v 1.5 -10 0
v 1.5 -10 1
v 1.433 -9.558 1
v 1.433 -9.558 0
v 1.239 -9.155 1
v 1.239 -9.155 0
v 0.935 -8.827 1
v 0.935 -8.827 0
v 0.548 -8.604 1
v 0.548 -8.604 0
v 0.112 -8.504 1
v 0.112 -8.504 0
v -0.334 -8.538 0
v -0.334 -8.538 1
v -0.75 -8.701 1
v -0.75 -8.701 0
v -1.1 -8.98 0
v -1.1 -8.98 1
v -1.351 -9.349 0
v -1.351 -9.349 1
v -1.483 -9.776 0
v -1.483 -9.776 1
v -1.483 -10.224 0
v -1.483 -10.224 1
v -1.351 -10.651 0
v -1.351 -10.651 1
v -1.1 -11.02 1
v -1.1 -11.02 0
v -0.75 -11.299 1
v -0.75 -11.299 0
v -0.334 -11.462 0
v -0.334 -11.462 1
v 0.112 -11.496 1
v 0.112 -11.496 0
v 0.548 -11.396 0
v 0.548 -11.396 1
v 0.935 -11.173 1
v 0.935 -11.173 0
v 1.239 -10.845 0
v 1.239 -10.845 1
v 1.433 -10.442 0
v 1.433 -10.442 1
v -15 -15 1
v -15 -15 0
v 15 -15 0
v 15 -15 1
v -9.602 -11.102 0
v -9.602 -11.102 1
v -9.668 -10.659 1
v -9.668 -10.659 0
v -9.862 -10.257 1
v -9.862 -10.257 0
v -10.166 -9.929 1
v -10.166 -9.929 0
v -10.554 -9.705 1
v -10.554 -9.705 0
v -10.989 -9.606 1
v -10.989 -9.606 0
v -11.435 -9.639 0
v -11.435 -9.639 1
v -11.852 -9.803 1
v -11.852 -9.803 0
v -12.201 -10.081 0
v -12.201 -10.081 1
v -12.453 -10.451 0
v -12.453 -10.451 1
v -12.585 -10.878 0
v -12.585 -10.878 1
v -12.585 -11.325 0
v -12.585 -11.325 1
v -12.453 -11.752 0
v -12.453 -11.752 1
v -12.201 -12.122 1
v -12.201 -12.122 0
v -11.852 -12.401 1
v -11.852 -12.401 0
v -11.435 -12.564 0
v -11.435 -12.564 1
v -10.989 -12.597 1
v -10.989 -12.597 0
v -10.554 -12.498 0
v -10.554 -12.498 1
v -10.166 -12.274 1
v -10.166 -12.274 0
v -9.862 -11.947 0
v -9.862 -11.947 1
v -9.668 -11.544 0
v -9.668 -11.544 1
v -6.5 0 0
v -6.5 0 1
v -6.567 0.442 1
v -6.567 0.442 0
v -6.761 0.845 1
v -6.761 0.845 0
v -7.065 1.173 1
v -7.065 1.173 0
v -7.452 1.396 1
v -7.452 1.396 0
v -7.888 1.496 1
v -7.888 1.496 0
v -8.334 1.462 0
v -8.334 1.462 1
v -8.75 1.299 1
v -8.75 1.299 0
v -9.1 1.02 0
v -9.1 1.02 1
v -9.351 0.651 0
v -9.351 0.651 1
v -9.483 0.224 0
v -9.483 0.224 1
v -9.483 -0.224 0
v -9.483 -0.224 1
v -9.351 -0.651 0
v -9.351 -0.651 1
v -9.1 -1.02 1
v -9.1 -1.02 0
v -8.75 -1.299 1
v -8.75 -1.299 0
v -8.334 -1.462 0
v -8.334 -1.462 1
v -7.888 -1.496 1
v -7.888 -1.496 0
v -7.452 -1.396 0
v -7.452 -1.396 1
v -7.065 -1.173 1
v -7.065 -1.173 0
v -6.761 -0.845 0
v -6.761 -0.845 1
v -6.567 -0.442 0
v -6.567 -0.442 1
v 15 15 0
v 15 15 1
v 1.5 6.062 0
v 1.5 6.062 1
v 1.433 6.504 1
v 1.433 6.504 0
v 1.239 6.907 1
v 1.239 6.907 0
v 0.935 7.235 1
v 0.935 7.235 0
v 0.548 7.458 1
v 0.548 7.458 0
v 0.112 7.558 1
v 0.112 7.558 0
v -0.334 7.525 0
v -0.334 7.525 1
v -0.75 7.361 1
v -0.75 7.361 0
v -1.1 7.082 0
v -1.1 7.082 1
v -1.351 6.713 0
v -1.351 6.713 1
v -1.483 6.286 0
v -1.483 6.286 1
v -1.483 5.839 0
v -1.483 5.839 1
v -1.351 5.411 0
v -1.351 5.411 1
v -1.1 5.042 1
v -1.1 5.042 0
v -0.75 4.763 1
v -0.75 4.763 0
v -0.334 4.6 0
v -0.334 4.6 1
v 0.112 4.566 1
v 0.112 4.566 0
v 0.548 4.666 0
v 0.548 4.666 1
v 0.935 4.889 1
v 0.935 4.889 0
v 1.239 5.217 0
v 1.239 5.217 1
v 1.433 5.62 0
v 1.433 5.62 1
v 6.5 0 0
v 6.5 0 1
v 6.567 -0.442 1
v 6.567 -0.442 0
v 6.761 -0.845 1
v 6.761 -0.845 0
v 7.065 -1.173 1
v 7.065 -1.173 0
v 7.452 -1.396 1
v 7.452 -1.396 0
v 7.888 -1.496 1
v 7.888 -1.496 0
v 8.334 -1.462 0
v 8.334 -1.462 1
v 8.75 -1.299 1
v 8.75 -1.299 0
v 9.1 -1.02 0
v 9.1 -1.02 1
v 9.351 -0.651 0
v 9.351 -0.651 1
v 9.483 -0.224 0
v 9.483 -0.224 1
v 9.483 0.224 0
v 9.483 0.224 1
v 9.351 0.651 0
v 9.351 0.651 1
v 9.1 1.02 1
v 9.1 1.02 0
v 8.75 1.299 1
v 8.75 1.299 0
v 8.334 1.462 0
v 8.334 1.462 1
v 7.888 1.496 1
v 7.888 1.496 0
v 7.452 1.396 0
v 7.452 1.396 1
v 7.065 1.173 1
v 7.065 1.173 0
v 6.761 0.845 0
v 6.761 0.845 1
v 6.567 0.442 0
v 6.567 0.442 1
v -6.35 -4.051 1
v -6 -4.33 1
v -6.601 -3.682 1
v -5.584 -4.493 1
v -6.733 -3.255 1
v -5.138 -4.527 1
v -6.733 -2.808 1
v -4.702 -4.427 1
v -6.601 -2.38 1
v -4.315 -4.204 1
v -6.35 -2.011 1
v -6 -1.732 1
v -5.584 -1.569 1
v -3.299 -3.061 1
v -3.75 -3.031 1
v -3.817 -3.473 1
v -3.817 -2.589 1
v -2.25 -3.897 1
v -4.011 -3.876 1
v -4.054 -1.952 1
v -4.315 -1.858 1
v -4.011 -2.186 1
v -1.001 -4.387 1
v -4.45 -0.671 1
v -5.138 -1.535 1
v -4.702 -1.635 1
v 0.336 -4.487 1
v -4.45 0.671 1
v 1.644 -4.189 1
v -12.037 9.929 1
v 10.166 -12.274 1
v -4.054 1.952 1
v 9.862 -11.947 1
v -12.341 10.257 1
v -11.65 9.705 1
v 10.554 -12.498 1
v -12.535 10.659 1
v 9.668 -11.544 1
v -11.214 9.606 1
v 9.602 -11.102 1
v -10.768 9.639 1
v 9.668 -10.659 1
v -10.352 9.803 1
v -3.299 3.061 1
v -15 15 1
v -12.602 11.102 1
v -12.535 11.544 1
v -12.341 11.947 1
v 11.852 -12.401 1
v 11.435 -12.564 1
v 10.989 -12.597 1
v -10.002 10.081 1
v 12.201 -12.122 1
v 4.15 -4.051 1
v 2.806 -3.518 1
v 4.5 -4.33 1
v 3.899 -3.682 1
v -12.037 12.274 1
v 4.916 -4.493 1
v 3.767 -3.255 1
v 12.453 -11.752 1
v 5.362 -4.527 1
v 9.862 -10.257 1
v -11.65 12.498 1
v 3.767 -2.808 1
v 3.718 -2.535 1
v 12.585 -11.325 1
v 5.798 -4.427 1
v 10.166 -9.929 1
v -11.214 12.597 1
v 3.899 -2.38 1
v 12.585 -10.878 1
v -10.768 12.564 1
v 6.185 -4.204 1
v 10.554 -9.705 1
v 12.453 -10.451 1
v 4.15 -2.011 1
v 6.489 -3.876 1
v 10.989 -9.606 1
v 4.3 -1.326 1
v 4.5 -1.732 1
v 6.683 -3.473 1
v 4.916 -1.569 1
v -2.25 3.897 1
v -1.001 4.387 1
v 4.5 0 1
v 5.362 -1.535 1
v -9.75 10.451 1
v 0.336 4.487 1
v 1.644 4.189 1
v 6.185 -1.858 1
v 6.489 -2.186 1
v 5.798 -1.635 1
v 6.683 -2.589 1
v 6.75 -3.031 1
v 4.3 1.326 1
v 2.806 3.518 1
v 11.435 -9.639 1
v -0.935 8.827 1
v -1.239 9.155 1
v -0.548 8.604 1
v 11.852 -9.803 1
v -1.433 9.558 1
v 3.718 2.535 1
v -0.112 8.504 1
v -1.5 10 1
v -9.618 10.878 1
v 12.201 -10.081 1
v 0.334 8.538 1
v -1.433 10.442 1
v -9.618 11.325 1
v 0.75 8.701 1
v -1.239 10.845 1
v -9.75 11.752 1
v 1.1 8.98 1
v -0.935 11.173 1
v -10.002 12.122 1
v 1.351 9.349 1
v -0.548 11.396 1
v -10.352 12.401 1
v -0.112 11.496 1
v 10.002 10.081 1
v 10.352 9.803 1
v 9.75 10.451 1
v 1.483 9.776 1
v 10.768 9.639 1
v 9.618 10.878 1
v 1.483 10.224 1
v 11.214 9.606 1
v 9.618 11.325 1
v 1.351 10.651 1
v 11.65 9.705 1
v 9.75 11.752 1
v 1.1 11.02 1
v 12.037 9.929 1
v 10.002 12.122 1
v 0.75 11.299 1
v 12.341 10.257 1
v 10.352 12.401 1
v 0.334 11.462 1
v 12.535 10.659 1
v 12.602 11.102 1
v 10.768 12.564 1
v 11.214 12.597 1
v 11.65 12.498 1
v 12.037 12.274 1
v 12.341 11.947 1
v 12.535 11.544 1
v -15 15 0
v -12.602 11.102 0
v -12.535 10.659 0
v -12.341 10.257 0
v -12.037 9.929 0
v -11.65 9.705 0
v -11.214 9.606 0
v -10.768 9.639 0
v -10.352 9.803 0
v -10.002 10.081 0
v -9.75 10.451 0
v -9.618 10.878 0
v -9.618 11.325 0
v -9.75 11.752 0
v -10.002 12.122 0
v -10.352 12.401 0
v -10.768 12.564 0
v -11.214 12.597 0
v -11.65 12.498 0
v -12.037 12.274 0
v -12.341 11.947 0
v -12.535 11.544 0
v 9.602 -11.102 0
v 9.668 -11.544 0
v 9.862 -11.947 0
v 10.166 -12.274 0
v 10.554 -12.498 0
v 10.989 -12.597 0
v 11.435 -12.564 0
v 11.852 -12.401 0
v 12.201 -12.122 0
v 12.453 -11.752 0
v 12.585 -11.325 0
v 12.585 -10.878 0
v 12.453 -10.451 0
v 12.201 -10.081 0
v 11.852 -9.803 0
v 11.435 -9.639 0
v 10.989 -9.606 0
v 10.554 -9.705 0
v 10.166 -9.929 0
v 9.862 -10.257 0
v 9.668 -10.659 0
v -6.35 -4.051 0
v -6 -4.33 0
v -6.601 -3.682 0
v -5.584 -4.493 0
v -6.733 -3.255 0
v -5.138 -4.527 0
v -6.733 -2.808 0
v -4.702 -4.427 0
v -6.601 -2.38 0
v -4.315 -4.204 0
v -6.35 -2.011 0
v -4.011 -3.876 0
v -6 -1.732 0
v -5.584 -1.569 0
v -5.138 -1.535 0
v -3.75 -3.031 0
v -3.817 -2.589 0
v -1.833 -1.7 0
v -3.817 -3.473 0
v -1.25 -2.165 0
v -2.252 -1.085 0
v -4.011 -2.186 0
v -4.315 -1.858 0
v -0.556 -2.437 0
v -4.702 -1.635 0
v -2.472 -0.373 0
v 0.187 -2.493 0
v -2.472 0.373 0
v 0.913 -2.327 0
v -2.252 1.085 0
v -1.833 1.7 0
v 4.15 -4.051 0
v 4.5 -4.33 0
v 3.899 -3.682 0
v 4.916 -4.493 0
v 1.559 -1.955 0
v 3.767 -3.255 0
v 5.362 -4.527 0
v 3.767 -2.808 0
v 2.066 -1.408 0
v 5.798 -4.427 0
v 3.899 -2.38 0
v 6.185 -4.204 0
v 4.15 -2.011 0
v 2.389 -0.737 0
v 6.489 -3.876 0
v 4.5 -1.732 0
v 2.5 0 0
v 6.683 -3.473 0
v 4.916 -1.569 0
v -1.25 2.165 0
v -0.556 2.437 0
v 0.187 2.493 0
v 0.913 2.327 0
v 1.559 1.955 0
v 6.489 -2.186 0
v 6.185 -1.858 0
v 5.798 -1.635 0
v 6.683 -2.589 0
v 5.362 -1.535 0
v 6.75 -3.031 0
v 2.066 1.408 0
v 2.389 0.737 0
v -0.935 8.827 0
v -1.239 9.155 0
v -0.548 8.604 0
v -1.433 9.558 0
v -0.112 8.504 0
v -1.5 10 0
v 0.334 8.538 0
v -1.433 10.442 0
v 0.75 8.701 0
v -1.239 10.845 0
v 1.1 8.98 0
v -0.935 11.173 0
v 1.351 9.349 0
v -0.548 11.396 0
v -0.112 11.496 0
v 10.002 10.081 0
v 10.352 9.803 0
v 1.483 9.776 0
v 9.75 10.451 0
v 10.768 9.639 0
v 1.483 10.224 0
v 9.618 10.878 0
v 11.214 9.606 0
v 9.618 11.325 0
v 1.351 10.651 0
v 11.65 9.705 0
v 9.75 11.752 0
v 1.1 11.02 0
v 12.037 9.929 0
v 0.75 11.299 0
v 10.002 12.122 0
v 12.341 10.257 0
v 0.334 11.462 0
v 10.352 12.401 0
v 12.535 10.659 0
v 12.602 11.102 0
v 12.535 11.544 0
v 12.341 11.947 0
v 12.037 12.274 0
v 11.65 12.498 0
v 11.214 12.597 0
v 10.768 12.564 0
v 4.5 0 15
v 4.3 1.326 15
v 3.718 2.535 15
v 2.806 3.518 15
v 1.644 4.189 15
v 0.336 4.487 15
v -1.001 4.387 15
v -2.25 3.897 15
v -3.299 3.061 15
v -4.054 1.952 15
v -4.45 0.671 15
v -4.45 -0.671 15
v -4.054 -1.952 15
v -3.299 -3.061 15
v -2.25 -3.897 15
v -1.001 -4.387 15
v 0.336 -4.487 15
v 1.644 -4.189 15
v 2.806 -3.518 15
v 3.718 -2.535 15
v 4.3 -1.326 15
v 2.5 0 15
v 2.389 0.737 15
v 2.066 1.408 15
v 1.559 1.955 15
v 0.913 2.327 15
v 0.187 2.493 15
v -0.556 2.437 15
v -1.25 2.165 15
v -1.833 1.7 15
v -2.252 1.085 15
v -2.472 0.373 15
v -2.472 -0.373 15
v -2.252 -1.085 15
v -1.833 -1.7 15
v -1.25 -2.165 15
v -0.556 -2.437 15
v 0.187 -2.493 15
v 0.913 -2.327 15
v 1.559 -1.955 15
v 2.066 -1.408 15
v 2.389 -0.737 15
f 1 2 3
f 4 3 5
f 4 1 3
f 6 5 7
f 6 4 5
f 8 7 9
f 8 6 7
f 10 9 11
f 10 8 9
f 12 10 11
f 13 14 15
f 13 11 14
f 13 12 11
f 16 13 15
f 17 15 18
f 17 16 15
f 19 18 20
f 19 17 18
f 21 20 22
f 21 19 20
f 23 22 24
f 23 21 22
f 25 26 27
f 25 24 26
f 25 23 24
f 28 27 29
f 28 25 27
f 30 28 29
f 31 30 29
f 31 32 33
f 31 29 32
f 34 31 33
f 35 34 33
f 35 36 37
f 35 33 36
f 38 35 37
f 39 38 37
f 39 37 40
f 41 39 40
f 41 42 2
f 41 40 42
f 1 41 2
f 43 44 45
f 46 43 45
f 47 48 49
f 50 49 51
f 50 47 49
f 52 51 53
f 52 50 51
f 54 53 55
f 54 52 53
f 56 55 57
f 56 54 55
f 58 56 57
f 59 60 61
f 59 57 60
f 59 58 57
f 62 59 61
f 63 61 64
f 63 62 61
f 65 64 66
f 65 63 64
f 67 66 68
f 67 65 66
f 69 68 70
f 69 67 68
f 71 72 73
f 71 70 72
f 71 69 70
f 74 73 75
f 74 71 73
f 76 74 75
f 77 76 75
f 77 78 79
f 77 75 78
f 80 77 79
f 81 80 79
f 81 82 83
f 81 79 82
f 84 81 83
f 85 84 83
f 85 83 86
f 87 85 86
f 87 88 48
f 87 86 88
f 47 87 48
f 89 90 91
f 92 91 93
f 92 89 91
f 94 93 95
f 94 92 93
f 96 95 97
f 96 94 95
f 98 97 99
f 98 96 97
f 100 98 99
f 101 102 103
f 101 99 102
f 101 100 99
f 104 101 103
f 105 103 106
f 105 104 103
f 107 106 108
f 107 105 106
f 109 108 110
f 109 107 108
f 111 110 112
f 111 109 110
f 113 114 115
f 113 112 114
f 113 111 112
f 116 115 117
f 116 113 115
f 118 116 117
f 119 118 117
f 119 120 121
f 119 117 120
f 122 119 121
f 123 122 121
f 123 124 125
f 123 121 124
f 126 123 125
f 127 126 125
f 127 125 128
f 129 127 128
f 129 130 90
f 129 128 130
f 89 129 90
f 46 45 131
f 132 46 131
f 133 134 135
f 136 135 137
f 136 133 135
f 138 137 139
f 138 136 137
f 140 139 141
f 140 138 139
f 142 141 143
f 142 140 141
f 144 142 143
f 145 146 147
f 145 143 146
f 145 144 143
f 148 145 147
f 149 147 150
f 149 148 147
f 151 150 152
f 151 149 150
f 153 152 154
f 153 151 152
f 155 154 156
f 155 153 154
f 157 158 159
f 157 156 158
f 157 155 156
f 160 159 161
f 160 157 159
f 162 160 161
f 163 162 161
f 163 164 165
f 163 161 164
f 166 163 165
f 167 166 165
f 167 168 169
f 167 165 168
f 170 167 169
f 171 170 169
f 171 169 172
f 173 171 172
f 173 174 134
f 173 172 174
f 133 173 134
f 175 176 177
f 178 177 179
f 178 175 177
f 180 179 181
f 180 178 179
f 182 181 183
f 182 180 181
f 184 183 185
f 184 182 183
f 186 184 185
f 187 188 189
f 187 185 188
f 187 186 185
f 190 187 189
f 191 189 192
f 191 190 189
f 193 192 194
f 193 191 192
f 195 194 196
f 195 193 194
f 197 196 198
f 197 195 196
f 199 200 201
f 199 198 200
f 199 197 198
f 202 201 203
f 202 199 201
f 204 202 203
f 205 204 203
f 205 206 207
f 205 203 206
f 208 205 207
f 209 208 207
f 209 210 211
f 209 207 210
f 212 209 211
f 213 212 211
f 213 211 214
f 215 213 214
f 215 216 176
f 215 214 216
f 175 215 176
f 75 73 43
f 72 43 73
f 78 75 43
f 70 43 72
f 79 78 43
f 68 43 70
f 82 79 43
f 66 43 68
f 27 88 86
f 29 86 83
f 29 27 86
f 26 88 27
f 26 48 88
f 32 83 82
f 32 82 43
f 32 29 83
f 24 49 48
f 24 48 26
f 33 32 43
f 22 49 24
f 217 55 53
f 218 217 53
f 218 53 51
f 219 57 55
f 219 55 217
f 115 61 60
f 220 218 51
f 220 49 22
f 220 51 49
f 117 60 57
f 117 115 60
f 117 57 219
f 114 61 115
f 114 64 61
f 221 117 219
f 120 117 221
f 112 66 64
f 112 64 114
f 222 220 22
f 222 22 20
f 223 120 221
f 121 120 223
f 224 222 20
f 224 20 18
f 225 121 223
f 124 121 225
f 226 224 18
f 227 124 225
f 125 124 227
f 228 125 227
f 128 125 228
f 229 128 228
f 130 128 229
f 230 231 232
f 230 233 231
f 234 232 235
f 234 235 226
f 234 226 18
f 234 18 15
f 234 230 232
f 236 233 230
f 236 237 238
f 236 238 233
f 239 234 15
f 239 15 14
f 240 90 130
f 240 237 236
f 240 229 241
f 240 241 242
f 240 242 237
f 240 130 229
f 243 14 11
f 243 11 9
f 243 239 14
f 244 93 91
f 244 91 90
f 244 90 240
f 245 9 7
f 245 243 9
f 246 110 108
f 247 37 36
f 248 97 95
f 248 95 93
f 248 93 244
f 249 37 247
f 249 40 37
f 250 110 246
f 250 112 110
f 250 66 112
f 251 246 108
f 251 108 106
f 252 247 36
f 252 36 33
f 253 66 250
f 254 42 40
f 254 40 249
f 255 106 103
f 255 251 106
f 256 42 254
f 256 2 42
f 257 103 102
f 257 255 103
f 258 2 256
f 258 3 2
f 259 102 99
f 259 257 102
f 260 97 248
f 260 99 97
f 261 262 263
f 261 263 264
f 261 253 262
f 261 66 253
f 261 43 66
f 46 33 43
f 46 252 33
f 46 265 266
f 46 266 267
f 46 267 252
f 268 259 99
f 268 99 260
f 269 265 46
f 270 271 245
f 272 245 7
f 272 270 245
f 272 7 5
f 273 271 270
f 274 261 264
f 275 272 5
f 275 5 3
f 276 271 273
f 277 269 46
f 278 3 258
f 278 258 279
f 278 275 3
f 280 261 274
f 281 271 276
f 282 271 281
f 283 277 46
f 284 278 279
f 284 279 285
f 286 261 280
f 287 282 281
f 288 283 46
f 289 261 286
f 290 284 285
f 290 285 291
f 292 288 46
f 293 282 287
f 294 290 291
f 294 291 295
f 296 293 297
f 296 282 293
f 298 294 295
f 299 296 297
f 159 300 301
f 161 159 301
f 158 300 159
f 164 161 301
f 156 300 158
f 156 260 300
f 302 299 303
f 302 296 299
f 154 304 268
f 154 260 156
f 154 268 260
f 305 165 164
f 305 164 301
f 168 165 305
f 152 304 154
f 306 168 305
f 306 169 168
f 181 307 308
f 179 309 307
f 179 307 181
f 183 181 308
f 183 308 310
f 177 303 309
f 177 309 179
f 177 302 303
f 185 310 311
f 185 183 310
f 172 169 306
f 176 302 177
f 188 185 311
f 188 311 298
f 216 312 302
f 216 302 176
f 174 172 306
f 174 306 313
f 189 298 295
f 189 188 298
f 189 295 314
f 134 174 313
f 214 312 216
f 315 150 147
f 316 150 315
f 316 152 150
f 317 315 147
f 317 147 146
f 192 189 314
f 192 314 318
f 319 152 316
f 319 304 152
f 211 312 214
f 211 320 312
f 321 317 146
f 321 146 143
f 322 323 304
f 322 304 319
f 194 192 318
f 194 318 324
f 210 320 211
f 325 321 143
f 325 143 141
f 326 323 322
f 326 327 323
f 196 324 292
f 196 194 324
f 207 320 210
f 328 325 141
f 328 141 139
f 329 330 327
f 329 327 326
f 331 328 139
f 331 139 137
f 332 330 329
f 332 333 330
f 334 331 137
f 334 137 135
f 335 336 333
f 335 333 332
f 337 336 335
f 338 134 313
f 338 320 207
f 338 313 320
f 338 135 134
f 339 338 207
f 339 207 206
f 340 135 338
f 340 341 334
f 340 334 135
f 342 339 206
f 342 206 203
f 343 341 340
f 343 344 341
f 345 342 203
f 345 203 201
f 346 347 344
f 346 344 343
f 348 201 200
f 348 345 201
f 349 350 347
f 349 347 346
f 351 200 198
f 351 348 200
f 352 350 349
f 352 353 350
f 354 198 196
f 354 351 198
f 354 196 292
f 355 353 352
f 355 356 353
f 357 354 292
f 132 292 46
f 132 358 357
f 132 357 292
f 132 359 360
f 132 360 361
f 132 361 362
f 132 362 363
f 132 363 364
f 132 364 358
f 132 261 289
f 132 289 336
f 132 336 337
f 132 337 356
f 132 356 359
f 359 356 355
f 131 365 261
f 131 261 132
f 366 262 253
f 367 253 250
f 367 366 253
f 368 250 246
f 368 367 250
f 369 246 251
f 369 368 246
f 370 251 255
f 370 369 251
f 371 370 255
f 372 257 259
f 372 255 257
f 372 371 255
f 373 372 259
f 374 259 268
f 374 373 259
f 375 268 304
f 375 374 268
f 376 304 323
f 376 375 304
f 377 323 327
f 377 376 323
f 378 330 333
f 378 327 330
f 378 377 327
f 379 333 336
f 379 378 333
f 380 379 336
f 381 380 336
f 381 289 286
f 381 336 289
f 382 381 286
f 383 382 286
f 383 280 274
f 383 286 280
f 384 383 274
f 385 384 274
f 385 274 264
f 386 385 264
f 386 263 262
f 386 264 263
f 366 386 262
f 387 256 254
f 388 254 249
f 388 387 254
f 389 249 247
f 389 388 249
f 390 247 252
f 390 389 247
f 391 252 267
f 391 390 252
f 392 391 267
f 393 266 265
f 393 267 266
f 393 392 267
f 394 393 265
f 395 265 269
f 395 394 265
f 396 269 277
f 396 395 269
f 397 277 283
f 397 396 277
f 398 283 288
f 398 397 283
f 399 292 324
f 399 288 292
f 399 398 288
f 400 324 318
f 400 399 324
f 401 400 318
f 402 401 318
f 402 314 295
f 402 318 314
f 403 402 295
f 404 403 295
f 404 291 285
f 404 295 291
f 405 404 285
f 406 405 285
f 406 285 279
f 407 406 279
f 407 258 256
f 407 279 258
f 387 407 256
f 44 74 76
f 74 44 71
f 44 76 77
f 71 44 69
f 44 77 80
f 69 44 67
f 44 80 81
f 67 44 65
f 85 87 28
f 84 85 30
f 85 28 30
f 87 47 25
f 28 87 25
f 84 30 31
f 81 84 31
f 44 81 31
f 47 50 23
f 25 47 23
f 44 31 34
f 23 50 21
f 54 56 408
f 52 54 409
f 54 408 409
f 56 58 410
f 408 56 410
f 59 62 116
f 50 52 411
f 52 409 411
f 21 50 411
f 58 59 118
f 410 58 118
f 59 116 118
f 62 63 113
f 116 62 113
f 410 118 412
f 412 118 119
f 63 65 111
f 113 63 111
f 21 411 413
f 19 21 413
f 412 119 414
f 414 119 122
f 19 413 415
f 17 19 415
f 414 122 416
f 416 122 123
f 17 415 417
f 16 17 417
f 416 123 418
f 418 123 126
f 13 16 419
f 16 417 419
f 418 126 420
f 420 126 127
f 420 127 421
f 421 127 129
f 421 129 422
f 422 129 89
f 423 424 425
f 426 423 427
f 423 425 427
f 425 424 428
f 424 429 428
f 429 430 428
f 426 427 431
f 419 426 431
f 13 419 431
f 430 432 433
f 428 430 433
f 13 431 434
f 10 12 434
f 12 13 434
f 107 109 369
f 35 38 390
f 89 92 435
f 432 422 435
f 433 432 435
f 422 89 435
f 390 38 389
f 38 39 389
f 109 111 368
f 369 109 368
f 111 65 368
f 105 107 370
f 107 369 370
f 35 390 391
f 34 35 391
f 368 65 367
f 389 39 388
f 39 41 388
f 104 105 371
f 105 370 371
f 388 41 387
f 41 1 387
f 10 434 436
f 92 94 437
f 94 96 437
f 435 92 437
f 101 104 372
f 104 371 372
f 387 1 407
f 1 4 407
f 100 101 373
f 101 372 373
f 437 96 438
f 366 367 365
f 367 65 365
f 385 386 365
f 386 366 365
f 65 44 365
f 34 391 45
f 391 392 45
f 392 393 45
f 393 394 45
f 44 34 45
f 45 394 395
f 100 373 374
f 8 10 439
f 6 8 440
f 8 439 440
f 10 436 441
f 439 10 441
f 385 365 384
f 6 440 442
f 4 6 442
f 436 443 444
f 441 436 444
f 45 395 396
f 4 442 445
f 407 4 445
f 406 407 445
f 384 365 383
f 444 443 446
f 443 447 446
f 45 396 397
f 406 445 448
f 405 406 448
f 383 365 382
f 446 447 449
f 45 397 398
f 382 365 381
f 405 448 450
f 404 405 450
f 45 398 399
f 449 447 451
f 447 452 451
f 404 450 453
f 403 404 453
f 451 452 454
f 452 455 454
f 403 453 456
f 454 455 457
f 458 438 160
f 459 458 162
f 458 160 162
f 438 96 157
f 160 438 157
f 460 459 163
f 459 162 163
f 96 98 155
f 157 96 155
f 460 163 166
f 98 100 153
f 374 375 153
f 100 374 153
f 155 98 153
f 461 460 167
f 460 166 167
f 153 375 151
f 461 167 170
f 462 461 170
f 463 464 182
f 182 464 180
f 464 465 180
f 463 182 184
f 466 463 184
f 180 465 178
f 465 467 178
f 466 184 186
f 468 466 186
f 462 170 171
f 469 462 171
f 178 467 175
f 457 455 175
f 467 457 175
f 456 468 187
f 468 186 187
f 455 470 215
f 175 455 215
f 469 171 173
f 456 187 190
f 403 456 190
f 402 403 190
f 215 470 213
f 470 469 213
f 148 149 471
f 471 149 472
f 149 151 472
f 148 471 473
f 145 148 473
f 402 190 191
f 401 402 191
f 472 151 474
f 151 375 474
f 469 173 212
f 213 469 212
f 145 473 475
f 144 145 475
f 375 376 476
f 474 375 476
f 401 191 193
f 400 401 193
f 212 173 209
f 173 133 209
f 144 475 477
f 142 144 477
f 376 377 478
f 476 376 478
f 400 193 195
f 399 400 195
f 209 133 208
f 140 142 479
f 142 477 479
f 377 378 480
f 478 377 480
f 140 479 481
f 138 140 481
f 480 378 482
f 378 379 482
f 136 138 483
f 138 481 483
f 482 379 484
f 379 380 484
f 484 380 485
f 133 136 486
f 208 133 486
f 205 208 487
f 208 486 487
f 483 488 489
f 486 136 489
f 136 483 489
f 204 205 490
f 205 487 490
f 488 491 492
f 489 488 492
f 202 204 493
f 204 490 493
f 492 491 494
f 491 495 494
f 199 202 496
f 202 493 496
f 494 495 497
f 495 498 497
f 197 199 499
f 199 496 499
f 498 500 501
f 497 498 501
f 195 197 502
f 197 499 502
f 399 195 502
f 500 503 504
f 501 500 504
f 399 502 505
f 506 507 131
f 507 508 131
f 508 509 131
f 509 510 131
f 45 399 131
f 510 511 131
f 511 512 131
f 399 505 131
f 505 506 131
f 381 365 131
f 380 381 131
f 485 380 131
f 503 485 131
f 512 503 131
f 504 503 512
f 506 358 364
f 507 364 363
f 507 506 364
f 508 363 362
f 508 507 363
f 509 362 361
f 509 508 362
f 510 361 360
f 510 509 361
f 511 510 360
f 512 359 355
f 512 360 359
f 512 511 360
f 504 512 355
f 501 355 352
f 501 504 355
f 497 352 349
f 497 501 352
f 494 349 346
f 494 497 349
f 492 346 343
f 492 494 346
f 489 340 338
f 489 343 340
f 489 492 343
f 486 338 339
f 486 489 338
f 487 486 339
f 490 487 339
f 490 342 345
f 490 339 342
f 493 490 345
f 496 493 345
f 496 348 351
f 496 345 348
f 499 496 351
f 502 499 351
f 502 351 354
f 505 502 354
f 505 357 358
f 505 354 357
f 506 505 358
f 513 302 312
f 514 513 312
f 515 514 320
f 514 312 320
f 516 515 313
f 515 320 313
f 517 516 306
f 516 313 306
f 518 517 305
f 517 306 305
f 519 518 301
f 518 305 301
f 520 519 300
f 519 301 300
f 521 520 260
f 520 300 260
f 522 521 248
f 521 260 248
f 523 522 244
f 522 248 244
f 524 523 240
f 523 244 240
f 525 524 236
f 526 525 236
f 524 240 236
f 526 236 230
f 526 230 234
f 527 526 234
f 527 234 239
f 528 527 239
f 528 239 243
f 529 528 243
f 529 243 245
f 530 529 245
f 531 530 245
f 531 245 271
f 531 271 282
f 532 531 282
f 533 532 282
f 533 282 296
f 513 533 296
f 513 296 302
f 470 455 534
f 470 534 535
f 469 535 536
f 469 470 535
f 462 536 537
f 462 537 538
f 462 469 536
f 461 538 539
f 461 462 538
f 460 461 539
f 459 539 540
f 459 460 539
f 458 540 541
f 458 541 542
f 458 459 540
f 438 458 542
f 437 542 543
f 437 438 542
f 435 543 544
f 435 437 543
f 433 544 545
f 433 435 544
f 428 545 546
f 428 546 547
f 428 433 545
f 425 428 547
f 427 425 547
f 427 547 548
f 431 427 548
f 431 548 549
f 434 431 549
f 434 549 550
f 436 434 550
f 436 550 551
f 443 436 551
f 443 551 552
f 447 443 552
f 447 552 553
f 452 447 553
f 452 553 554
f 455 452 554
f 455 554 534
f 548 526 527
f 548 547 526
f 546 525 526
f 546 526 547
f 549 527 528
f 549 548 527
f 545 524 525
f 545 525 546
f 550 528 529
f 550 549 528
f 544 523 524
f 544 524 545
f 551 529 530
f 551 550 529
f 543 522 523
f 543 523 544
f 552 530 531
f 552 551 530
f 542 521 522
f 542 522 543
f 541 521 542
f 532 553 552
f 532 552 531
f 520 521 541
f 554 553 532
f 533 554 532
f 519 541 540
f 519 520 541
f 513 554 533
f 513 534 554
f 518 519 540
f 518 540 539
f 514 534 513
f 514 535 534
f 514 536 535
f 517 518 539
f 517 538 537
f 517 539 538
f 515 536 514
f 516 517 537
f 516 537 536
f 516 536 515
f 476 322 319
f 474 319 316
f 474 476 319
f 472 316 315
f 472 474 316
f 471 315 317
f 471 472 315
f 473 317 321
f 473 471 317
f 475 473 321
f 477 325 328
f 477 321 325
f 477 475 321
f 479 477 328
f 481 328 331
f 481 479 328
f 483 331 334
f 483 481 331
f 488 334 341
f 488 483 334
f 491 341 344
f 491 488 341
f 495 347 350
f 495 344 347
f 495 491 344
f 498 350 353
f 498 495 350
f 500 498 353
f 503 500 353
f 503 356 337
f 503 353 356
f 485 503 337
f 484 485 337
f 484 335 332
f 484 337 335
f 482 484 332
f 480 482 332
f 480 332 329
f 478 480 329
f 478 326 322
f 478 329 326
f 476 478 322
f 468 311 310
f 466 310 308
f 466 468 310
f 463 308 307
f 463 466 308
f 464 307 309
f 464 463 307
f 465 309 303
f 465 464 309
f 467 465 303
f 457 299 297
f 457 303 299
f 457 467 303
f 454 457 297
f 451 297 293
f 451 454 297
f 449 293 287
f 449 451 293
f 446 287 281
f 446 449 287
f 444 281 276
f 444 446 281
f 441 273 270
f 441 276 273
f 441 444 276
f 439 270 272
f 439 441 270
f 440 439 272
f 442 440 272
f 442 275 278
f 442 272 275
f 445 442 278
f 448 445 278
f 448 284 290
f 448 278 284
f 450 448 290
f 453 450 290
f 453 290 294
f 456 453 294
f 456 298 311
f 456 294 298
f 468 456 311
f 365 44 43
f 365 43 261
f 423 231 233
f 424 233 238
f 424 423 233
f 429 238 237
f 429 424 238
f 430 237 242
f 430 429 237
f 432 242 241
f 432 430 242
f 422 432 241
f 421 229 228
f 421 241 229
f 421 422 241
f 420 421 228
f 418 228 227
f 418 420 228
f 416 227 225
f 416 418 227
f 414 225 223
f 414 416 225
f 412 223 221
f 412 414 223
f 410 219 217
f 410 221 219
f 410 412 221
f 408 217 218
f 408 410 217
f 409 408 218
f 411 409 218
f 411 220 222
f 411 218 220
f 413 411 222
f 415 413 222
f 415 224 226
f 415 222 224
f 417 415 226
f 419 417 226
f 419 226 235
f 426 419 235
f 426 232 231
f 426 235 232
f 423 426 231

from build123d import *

# Parameters (mm, degrees)
SKETCH2_R           = 4.5
SKETCH2_R_2         = 2.5
BOSS_EXTRUDE4_DEPTH = 15
SKETCH3_W           = 30
SKETCH3_H           = 30
BOSS_EXTRUDE5_DEPTH = 1
SKETCH6_R           = 1.5
SKETCH6_R_2         = 2.5
CUT_EXTRUDE4_DEPTH  = 20


with BuildPart() as part:
    # Sketch2 → Boss-Extrude4 (new body)
    with BuildSketch(Plane.XY):
        Circle(SKETCH2_R)
        Circle(SKETCH2_R_2, mode=Mode.SUBTRACT)
    extrude(amount=BOSS_EXTRUDE4_DEPTH)

    # Sketch3 → Boss-Extrude5 (add)
    with BuildSketch(Plane.XY):
        Rectangle(SKETCH3_W, SKETCH3_H)
    extrude(amount=BOSS_EXTRUDE5_DEPTH)

    # Sketch6 → Cut-Extrude4 (cut)
    with BuildSketch(Plane.XY):
        with Locations((-11.101576465, -11.101576465)):
            Circle(SKETCH6_R)
        with Locations(Location((11.101576465, -11.101576465, 0), (0, 0, 180))):
            Circle(SKETCH6_R)
        with Locations((11.101576465, 11.101576465)):
            Circle(SKETCH6_R)
        with Locations(Location((-11.101576465, 11.101576465, 0), (0, 0, 180))):
            Circle(SKETCH6_R)
        with Locations((0, -10)):
            Circle(SKETCH6_R)
        with Locations(Location((0, 10, 0), (0, 0, 180))):
            Circle(SKETCH6_R)
        with Locations((-8, 0)):
            Circle(SKETCH6_R)
        with Locations(Location((8, 0, 0), (0, 0, 180))):
            Circle(SKETCH6_R)
        with Locations((0, 6.062177826)):
            Circle(SKETCH6_R)
        with Locations((5.25, -3.031088913)):
            Circle(SKETCH6_R)
        with Locations((-5.25, -3.031088913)):
            Circle(SKETCH6_R)
        Circle(SKETCH6_R_2)
    extrude(amount=CUT_EXTRUDE4_DEPTH, mode=Mode.SUBTRACT)


solid = part.part
